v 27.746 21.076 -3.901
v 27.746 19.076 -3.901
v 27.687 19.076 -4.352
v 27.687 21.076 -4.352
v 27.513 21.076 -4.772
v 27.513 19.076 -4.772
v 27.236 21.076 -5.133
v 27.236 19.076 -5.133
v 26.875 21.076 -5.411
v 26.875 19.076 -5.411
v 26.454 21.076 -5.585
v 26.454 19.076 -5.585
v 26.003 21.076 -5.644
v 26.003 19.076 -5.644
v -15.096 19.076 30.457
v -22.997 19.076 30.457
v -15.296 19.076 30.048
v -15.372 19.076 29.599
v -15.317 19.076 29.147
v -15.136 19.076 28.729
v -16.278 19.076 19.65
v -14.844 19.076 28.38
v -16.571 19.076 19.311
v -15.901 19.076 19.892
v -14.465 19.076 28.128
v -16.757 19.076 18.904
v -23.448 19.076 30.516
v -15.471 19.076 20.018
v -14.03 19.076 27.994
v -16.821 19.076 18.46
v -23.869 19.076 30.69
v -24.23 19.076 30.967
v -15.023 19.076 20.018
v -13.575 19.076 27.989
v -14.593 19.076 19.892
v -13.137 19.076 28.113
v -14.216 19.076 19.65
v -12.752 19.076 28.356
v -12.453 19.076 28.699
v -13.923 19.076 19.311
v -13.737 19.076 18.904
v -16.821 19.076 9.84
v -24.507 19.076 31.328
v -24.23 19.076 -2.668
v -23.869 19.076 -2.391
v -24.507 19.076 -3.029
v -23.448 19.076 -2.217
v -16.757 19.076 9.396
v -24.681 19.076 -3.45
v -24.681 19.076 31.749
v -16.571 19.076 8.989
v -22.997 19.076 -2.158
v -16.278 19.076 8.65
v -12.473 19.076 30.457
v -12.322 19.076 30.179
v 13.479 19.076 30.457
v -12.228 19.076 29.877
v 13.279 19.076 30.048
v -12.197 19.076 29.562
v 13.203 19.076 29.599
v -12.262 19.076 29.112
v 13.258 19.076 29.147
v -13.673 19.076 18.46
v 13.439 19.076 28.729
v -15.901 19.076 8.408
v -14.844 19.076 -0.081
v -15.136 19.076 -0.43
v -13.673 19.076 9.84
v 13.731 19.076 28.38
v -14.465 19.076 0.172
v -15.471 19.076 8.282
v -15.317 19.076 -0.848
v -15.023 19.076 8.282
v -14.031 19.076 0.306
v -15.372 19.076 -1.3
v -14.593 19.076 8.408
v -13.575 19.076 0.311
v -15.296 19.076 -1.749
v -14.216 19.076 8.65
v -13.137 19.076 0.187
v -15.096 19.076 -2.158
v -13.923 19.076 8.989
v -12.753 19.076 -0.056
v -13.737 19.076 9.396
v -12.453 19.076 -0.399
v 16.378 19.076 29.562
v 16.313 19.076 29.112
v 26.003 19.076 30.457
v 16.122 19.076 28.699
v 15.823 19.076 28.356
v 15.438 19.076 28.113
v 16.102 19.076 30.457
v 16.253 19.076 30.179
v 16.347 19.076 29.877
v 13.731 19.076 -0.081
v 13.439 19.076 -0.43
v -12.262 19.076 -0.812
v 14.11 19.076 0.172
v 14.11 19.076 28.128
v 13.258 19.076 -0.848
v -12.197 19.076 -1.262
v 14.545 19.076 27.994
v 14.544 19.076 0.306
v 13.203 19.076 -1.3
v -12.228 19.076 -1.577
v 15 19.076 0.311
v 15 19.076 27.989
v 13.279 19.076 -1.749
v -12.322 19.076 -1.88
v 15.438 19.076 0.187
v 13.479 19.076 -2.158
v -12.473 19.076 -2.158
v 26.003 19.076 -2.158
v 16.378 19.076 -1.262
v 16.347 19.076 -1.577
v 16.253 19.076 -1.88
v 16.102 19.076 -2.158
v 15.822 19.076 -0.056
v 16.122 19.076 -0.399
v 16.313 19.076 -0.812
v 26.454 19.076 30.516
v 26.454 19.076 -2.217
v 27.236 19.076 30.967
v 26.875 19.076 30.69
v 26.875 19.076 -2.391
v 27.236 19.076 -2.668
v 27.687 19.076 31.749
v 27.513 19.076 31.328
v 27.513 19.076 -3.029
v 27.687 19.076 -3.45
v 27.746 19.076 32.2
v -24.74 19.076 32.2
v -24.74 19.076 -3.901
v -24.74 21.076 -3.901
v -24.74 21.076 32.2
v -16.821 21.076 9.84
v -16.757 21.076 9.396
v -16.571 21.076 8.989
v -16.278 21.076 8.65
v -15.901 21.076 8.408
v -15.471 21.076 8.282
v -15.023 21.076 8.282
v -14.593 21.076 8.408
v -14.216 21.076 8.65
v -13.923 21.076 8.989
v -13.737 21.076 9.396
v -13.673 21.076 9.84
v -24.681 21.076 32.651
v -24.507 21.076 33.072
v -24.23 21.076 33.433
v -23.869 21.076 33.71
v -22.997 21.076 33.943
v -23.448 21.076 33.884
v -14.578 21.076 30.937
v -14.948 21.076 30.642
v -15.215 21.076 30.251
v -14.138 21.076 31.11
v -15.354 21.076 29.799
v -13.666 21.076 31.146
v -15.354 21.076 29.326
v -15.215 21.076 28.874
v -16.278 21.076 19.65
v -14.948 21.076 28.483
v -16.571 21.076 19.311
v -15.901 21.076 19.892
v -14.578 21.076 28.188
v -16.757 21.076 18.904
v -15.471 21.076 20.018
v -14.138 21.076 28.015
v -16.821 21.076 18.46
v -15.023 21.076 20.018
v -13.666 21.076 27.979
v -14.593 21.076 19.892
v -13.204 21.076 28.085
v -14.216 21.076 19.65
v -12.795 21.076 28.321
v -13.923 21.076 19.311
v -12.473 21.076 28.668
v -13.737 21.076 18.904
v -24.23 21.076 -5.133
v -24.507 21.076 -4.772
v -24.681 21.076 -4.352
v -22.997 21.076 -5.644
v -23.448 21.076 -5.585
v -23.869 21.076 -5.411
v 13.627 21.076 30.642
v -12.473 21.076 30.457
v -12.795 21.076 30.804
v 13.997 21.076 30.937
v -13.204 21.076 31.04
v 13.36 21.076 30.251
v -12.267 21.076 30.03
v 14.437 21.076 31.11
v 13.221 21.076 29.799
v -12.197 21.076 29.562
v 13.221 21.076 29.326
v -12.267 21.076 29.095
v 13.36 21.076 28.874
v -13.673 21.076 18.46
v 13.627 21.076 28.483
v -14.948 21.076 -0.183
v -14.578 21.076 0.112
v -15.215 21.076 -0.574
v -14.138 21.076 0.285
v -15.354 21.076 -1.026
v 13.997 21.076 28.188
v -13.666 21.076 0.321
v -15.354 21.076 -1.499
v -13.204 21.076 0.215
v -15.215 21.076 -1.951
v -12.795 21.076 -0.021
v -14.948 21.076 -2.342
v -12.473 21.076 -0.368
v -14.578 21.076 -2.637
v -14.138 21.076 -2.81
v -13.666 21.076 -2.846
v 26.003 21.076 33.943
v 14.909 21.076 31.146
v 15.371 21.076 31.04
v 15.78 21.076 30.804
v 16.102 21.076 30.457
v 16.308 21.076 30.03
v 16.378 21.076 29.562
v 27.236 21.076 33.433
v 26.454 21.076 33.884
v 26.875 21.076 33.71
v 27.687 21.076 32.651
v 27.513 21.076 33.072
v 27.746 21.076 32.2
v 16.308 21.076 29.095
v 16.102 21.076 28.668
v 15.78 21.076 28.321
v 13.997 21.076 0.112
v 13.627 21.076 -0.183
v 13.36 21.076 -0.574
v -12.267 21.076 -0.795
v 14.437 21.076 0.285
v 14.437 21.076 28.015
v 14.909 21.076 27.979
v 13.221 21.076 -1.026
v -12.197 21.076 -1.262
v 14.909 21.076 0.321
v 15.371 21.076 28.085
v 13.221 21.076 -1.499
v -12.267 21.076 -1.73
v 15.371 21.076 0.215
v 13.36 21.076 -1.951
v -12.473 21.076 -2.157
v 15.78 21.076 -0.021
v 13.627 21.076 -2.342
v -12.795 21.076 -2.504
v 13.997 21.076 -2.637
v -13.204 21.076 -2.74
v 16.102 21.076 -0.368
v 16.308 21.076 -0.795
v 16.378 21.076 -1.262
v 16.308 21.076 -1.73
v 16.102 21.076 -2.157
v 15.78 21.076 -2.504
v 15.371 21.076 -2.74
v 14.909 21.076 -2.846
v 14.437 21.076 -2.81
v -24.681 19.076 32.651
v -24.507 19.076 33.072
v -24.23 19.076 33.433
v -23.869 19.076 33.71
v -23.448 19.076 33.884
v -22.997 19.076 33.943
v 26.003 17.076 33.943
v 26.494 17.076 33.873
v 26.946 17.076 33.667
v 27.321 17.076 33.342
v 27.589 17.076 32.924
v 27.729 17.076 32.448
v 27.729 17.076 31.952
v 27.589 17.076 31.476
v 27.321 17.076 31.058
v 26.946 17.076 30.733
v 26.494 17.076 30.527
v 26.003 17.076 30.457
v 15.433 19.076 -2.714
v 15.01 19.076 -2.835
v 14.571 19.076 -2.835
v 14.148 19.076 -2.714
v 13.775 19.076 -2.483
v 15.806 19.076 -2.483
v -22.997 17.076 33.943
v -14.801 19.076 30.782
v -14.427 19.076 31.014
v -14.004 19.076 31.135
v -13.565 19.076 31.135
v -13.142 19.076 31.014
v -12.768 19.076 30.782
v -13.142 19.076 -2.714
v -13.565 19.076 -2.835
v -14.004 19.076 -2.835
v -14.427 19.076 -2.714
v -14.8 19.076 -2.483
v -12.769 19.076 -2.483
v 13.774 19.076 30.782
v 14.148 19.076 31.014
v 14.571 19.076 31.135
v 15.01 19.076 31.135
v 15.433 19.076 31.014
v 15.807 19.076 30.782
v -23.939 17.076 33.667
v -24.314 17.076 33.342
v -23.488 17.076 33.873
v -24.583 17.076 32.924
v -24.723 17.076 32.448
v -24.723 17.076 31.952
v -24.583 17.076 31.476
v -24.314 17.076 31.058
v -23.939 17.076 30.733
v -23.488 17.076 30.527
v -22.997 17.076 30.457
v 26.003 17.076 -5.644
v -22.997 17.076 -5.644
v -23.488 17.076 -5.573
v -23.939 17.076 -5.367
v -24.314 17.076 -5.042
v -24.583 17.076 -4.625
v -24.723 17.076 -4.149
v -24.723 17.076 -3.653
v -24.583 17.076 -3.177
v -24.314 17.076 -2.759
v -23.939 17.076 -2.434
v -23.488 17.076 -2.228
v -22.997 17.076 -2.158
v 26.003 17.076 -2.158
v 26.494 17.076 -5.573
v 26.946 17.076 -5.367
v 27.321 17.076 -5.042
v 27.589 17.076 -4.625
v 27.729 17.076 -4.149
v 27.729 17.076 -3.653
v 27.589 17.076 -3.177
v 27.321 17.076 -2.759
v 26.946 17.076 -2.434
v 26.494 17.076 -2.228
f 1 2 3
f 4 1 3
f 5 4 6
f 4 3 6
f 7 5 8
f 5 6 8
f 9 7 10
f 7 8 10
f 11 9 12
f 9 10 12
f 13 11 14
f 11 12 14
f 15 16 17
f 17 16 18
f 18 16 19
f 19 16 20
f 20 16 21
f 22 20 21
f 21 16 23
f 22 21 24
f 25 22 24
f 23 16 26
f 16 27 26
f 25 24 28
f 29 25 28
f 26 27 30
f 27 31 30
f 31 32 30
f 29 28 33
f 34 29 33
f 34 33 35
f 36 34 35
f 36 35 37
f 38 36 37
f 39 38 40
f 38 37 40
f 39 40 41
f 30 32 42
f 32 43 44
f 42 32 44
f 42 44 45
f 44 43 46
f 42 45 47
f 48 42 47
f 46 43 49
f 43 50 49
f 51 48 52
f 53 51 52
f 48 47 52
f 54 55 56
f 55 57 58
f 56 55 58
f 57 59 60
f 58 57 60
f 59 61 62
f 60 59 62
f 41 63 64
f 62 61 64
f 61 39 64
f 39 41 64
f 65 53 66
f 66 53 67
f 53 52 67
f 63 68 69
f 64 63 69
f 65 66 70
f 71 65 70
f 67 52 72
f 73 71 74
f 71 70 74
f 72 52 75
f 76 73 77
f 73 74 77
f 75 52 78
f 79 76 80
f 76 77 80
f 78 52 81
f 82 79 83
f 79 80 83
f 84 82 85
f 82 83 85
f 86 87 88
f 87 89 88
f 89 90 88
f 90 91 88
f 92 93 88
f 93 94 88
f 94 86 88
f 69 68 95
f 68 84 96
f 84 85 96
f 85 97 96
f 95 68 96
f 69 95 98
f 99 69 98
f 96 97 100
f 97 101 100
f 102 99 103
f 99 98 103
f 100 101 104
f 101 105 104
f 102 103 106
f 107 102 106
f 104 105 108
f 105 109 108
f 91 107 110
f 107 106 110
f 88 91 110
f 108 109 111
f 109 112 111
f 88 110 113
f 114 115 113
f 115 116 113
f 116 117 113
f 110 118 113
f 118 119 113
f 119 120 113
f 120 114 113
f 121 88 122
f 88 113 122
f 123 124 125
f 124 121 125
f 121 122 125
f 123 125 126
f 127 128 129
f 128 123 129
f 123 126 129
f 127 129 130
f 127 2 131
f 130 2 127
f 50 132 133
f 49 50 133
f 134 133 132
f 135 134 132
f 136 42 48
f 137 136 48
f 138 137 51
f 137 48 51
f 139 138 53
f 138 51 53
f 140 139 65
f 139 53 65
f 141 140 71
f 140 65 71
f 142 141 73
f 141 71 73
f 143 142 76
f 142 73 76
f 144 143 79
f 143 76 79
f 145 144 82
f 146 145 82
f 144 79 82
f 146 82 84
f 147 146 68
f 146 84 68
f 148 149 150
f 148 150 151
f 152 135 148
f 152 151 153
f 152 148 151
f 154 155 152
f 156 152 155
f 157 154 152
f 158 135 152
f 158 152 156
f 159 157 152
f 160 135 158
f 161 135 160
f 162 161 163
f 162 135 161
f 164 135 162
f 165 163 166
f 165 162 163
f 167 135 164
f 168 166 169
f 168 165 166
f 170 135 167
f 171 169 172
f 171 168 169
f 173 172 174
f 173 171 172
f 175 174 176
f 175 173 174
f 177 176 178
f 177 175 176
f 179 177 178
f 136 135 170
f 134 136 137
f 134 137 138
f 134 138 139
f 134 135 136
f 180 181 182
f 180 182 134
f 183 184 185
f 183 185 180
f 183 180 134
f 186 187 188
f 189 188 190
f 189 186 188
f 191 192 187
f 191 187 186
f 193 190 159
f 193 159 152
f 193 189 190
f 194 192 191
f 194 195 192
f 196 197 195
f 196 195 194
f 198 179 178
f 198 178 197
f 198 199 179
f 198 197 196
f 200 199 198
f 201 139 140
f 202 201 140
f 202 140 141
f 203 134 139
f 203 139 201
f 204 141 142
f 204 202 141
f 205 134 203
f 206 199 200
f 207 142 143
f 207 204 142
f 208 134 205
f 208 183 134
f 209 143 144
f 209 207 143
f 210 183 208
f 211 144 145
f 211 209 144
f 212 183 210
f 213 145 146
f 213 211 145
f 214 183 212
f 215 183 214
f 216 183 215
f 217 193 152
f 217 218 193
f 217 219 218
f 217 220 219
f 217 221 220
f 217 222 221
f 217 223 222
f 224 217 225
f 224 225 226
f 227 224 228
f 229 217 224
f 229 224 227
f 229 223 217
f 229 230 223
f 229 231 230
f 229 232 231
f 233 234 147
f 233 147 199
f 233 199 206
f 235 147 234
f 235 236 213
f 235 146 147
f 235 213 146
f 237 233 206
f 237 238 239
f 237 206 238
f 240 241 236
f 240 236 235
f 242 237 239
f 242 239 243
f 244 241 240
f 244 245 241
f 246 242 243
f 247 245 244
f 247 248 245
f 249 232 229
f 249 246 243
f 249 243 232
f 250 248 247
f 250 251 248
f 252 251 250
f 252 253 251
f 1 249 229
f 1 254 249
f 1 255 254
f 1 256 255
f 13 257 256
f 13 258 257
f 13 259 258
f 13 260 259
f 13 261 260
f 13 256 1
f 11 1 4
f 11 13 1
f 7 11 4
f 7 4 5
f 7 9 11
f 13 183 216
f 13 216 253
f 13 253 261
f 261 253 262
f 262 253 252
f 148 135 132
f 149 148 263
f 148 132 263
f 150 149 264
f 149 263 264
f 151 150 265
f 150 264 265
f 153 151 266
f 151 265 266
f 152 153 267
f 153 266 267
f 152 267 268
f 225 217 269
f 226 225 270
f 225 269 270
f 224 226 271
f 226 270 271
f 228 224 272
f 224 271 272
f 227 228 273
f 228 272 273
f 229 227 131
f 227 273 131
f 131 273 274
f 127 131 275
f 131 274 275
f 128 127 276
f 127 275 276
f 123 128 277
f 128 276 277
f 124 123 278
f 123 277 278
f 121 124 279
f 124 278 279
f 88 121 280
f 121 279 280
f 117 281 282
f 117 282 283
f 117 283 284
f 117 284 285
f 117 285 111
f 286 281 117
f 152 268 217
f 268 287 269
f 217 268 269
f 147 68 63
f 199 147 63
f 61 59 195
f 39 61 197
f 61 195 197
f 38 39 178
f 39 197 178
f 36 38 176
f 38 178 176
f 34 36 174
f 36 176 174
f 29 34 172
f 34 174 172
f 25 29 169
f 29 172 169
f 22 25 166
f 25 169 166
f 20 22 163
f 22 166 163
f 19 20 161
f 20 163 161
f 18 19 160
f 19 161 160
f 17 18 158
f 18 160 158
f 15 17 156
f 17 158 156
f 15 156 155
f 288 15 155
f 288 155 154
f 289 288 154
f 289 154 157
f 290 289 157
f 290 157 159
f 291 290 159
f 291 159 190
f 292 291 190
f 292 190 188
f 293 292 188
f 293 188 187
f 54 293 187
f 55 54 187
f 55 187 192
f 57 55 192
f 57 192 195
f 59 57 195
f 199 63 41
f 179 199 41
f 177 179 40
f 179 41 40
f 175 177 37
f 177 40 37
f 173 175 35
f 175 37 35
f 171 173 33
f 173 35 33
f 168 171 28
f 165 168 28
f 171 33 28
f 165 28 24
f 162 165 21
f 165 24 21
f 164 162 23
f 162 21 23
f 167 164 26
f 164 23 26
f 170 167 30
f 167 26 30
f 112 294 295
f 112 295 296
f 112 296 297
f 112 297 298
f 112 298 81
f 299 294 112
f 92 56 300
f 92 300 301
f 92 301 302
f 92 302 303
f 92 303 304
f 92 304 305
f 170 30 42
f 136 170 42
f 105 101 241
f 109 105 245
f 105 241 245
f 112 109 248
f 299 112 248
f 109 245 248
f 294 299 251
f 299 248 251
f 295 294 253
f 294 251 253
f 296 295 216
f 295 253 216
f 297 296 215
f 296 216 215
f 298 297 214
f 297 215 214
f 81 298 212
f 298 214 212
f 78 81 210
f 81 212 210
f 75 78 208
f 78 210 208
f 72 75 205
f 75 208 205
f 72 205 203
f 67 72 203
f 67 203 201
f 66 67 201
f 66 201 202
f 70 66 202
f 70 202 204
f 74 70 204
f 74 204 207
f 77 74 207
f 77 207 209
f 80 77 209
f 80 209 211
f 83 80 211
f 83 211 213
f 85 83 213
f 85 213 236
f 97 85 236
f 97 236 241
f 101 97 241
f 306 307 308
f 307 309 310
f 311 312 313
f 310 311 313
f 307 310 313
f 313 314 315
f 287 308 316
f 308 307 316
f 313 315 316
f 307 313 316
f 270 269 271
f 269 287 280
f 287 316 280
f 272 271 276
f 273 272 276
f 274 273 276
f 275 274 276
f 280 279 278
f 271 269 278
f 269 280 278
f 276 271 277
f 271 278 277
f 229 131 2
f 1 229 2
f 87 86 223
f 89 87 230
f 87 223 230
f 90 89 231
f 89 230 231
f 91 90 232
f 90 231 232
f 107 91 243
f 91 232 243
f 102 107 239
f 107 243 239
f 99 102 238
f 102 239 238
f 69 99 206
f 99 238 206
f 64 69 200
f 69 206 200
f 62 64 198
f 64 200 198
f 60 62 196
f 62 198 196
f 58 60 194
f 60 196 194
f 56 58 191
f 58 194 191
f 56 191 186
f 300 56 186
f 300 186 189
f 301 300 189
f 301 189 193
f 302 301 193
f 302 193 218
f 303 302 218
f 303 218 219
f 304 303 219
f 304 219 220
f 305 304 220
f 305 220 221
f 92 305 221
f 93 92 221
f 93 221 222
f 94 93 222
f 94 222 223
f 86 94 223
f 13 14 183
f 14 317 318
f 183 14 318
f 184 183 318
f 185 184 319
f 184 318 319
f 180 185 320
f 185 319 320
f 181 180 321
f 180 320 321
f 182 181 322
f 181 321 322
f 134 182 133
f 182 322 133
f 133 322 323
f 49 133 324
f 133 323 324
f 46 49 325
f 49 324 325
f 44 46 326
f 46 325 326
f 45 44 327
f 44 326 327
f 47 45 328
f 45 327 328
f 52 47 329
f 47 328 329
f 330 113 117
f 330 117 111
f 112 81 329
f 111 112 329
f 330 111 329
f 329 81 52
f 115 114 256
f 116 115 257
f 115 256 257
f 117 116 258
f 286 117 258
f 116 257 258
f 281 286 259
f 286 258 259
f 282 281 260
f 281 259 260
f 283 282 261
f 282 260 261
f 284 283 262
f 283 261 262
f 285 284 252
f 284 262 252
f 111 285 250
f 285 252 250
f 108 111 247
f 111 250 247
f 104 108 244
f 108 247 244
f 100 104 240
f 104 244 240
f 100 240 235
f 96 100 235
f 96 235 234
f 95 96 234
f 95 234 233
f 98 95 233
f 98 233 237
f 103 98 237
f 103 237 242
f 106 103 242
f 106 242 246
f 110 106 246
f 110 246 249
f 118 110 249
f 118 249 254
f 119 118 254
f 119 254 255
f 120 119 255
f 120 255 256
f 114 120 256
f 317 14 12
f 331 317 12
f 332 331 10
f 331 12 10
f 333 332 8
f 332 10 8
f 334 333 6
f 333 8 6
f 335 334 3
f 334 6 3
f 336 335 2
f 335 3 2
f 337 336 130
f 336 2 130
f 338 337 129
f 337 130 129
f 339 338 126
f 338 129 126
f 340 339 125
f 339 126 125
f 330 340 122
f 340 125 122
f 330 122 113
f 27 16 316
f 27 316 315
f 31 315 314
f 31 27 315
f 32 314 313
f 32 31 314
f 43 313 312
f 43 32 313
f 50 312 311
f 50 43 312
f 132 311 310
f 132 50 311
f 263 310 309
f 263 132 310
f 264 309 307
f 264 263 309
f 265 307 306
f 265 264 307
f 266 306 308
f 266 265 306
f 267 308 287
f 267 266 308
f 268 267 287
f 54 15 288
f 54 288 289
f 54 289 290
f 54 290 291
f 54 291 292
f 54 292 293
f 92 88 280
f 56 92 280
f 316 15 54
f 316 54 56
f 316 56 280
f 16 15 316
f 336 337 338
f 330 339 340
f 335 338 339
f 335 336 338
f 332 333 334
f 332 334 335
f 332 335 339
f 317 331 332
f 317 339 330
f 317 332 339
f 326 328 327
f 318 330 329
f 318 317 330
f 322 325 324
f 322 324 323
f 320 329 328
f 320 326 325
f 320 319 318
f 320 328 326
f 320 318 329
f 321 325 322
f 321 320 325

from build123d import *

# Parameters (mm, degrees)
SALIENTE_EXTRUIR1_DEPTH   = 2
SALIENTE_EXTRUIR1_2_DEPTH = 2
SALIENTE_EXTRUIR2_DEPTH   = 2
CROQUIS4_R                = 1.5875
CORTAR_EXTRUIR1_DEPTH     = 2


with BuildPart() as part:
    # Croquis2 → Saliente-Extruir1 (new body)
    with BuildSketch(Plane(origin=(0, 19.076482476, 0), x_dir=(1, 0, 0), z_dir=(0, 1, 0))):
        with BuildLine():
            Line((-22.996964511, 5.644085043), (26.003035489, 5.644085043))
            ThreePointArc((26.003035489, 5.644085043), (27.74632721, 3.900793322), (26.003035489, 2.157501601))
            Line((26.003035489, 2.157501601), (-22.996964511, 2.157501601))
            ThreePointArc((-22.996964511, 2.157501601), (-24.740256232, 3.900793322), (-22.996964511, 5.644085043))
        make_face()
    extrude(amount=-SALIENTE_EXTRUIR1_DEPTH)



with BuildPart() as body_2:
    # Croquis2 → Saliente-Extruir1 2 (new body)
    with BuildSketch(Plane(origin=(0, 19.076482476, 0), x_dir=(1, 0, 0), z_dir=(0, 1, 0))):
        with BuildLine():
            Line((-22.996964511, -33.943291721), (26.003035489, -33.943291721))
            ThreePointArc((26.003035489, -33.943291721), (27.74632721, -32.2), (26.003035489, -30.456708279))
            Line((26.003035489, -30.456708279), (-22.996964511, -30.456708279))
            ThreePointArc((-22.996964511, -30.456708279), (-24.740256232, -32.2), (-22.996964511, -33.943291721))
        make_face()
    extrude(amount=-SALIENTE_EXTRUIR1_2_DEPTH)


with BuildPart() as part_1:
    add(part.part)

    add(body_2.part)  # Saliente-Extruir2 merges body 2
    # Croquis3 → Saliente-Extruir2 (add)
    with BuildSketch(Plane(origin=(0, 19.076482476, 0), x_dir=(1, 0, 0), z_dir=(0, 1, 0))):
        with BuildLine():
            ThreePointArc((-24.740256232, 3.900793322), (-24.229657908, 2.668099924), (-22.996964511, 2.157501601))
            Line((-22.996964511, 2.157501601), (26.003035489, 2.157501601))
            ThreePointArc((26.003035489, 2.157501601), (27.235728887, 2.668099924), (27.74632721, 3.900793322))
            ThreePointArc((27.74632721, 3.900793322), (27.235728887, 5.133486719), (26.003035489, 5.644085043))
            Line((26.003035489, 5.644085043), (-22.996964511, 5.644085043))
            ThreePointArc((-22.996964511, 5.644085043), (-24.229657908, 5.133486719), (-24.740256232, 3.900793322))
        make_face()
        with BuildLine():
            Line((26.003035489, 2.157501601), (-22.996964511, 2.157501601))
            ThreePointArc((-22.996964511, 2.157501601), (-24.229657908, 2.668099924), (-24.740256232, 3.900793322))
            Line((-24.740256232, 3.900793322), (-24.740256232, -32.2))
            ThreePointArc((-24.740256232, -32.2), (-24.229657908, -30.967306602), (-22.996964511, -30.456708279))
            Line((-22.996964511, -30.456708279), (26.003035489, -30.456708279))
            ThreePointArc((26.003035489, -30.456708279), (27.235728887, -30.967306602), (27.74632721, -32.2))
            Line((27.74632721, -32.2), (27.74632721, 3.900793322))
            ThreePointArc((27.74632721, 3.900793322), (27.235728887, 2.668099924), (26.003035489, 2.157501601))
        make_face()
        with BuildLine():
            Line((-16.821172495, -18.46), (-16.821172495, -9.84))
            ThreePointArc((-16.821172495, -9.84), (-15.246964511, -8.265792016), (-13.672756527, -9.84))
            Line((-13.672756527, -9.84), (-13.672756527, -18.46))
            ThreePointArc((-13.672756527, -18.46), (-15.246964511, -20.034207984), (-16.821172495, -18.46))
        make_face(mode=Mode.SUBTRACT)
        with BuildLine():
            ThreePointArc((-22.996964511, -30.456708279), (-24.229657908, -30.967306602), (-24.740256232, -32.2))
            ThreePointArc((-24.740256232, -32.2), (-24.229657908, -33.432693398), (-22.996964511, -33.943291721))
            Line((-22.996964511, -33.943291721), (26.003035489, -33.943291721))
            ThreePointArc((26.003035489, -33.943291721), (27.235728887, -33.432693398), (27.74632721, -32.2))
            ThreePointArc((27.74632721, -32.2), (27.235728887, -30.967306602), (26.003035489, -30.456708279))
            Line((26.003035489, -30.456708279), (-22.996964511, -30.456708279))
        make_face()
    extrude(amount=SALIENTE_EXTRUIR2_DEPTH)

    # Croquis4 → Cortar-Extruir1 (cut)
    with BuildSketch(Plane(origin=(0, 21.076482476, 0), x_dir=(1, 0, 0), z_dir=(0, 1, 0))):
        with Locations((-13.784464511, 1.2625)):
            Circle(CROQUIS4_R)
        with Locations((14.790535489, 1.2625)):
            Circle(CROQUIS4_R)
        with Locations((14.790535489, -29.5625)):
            Circle(CROQUIS4_R)
        with Locations((-13.784464511, -29.5625)):
            Circle(CROQUIS4_R)
    extrude(amount=-CORTAR_EXTRUIR1_DEPTH, mode=Mode.SUBTRACT)


solid = part_1.part
